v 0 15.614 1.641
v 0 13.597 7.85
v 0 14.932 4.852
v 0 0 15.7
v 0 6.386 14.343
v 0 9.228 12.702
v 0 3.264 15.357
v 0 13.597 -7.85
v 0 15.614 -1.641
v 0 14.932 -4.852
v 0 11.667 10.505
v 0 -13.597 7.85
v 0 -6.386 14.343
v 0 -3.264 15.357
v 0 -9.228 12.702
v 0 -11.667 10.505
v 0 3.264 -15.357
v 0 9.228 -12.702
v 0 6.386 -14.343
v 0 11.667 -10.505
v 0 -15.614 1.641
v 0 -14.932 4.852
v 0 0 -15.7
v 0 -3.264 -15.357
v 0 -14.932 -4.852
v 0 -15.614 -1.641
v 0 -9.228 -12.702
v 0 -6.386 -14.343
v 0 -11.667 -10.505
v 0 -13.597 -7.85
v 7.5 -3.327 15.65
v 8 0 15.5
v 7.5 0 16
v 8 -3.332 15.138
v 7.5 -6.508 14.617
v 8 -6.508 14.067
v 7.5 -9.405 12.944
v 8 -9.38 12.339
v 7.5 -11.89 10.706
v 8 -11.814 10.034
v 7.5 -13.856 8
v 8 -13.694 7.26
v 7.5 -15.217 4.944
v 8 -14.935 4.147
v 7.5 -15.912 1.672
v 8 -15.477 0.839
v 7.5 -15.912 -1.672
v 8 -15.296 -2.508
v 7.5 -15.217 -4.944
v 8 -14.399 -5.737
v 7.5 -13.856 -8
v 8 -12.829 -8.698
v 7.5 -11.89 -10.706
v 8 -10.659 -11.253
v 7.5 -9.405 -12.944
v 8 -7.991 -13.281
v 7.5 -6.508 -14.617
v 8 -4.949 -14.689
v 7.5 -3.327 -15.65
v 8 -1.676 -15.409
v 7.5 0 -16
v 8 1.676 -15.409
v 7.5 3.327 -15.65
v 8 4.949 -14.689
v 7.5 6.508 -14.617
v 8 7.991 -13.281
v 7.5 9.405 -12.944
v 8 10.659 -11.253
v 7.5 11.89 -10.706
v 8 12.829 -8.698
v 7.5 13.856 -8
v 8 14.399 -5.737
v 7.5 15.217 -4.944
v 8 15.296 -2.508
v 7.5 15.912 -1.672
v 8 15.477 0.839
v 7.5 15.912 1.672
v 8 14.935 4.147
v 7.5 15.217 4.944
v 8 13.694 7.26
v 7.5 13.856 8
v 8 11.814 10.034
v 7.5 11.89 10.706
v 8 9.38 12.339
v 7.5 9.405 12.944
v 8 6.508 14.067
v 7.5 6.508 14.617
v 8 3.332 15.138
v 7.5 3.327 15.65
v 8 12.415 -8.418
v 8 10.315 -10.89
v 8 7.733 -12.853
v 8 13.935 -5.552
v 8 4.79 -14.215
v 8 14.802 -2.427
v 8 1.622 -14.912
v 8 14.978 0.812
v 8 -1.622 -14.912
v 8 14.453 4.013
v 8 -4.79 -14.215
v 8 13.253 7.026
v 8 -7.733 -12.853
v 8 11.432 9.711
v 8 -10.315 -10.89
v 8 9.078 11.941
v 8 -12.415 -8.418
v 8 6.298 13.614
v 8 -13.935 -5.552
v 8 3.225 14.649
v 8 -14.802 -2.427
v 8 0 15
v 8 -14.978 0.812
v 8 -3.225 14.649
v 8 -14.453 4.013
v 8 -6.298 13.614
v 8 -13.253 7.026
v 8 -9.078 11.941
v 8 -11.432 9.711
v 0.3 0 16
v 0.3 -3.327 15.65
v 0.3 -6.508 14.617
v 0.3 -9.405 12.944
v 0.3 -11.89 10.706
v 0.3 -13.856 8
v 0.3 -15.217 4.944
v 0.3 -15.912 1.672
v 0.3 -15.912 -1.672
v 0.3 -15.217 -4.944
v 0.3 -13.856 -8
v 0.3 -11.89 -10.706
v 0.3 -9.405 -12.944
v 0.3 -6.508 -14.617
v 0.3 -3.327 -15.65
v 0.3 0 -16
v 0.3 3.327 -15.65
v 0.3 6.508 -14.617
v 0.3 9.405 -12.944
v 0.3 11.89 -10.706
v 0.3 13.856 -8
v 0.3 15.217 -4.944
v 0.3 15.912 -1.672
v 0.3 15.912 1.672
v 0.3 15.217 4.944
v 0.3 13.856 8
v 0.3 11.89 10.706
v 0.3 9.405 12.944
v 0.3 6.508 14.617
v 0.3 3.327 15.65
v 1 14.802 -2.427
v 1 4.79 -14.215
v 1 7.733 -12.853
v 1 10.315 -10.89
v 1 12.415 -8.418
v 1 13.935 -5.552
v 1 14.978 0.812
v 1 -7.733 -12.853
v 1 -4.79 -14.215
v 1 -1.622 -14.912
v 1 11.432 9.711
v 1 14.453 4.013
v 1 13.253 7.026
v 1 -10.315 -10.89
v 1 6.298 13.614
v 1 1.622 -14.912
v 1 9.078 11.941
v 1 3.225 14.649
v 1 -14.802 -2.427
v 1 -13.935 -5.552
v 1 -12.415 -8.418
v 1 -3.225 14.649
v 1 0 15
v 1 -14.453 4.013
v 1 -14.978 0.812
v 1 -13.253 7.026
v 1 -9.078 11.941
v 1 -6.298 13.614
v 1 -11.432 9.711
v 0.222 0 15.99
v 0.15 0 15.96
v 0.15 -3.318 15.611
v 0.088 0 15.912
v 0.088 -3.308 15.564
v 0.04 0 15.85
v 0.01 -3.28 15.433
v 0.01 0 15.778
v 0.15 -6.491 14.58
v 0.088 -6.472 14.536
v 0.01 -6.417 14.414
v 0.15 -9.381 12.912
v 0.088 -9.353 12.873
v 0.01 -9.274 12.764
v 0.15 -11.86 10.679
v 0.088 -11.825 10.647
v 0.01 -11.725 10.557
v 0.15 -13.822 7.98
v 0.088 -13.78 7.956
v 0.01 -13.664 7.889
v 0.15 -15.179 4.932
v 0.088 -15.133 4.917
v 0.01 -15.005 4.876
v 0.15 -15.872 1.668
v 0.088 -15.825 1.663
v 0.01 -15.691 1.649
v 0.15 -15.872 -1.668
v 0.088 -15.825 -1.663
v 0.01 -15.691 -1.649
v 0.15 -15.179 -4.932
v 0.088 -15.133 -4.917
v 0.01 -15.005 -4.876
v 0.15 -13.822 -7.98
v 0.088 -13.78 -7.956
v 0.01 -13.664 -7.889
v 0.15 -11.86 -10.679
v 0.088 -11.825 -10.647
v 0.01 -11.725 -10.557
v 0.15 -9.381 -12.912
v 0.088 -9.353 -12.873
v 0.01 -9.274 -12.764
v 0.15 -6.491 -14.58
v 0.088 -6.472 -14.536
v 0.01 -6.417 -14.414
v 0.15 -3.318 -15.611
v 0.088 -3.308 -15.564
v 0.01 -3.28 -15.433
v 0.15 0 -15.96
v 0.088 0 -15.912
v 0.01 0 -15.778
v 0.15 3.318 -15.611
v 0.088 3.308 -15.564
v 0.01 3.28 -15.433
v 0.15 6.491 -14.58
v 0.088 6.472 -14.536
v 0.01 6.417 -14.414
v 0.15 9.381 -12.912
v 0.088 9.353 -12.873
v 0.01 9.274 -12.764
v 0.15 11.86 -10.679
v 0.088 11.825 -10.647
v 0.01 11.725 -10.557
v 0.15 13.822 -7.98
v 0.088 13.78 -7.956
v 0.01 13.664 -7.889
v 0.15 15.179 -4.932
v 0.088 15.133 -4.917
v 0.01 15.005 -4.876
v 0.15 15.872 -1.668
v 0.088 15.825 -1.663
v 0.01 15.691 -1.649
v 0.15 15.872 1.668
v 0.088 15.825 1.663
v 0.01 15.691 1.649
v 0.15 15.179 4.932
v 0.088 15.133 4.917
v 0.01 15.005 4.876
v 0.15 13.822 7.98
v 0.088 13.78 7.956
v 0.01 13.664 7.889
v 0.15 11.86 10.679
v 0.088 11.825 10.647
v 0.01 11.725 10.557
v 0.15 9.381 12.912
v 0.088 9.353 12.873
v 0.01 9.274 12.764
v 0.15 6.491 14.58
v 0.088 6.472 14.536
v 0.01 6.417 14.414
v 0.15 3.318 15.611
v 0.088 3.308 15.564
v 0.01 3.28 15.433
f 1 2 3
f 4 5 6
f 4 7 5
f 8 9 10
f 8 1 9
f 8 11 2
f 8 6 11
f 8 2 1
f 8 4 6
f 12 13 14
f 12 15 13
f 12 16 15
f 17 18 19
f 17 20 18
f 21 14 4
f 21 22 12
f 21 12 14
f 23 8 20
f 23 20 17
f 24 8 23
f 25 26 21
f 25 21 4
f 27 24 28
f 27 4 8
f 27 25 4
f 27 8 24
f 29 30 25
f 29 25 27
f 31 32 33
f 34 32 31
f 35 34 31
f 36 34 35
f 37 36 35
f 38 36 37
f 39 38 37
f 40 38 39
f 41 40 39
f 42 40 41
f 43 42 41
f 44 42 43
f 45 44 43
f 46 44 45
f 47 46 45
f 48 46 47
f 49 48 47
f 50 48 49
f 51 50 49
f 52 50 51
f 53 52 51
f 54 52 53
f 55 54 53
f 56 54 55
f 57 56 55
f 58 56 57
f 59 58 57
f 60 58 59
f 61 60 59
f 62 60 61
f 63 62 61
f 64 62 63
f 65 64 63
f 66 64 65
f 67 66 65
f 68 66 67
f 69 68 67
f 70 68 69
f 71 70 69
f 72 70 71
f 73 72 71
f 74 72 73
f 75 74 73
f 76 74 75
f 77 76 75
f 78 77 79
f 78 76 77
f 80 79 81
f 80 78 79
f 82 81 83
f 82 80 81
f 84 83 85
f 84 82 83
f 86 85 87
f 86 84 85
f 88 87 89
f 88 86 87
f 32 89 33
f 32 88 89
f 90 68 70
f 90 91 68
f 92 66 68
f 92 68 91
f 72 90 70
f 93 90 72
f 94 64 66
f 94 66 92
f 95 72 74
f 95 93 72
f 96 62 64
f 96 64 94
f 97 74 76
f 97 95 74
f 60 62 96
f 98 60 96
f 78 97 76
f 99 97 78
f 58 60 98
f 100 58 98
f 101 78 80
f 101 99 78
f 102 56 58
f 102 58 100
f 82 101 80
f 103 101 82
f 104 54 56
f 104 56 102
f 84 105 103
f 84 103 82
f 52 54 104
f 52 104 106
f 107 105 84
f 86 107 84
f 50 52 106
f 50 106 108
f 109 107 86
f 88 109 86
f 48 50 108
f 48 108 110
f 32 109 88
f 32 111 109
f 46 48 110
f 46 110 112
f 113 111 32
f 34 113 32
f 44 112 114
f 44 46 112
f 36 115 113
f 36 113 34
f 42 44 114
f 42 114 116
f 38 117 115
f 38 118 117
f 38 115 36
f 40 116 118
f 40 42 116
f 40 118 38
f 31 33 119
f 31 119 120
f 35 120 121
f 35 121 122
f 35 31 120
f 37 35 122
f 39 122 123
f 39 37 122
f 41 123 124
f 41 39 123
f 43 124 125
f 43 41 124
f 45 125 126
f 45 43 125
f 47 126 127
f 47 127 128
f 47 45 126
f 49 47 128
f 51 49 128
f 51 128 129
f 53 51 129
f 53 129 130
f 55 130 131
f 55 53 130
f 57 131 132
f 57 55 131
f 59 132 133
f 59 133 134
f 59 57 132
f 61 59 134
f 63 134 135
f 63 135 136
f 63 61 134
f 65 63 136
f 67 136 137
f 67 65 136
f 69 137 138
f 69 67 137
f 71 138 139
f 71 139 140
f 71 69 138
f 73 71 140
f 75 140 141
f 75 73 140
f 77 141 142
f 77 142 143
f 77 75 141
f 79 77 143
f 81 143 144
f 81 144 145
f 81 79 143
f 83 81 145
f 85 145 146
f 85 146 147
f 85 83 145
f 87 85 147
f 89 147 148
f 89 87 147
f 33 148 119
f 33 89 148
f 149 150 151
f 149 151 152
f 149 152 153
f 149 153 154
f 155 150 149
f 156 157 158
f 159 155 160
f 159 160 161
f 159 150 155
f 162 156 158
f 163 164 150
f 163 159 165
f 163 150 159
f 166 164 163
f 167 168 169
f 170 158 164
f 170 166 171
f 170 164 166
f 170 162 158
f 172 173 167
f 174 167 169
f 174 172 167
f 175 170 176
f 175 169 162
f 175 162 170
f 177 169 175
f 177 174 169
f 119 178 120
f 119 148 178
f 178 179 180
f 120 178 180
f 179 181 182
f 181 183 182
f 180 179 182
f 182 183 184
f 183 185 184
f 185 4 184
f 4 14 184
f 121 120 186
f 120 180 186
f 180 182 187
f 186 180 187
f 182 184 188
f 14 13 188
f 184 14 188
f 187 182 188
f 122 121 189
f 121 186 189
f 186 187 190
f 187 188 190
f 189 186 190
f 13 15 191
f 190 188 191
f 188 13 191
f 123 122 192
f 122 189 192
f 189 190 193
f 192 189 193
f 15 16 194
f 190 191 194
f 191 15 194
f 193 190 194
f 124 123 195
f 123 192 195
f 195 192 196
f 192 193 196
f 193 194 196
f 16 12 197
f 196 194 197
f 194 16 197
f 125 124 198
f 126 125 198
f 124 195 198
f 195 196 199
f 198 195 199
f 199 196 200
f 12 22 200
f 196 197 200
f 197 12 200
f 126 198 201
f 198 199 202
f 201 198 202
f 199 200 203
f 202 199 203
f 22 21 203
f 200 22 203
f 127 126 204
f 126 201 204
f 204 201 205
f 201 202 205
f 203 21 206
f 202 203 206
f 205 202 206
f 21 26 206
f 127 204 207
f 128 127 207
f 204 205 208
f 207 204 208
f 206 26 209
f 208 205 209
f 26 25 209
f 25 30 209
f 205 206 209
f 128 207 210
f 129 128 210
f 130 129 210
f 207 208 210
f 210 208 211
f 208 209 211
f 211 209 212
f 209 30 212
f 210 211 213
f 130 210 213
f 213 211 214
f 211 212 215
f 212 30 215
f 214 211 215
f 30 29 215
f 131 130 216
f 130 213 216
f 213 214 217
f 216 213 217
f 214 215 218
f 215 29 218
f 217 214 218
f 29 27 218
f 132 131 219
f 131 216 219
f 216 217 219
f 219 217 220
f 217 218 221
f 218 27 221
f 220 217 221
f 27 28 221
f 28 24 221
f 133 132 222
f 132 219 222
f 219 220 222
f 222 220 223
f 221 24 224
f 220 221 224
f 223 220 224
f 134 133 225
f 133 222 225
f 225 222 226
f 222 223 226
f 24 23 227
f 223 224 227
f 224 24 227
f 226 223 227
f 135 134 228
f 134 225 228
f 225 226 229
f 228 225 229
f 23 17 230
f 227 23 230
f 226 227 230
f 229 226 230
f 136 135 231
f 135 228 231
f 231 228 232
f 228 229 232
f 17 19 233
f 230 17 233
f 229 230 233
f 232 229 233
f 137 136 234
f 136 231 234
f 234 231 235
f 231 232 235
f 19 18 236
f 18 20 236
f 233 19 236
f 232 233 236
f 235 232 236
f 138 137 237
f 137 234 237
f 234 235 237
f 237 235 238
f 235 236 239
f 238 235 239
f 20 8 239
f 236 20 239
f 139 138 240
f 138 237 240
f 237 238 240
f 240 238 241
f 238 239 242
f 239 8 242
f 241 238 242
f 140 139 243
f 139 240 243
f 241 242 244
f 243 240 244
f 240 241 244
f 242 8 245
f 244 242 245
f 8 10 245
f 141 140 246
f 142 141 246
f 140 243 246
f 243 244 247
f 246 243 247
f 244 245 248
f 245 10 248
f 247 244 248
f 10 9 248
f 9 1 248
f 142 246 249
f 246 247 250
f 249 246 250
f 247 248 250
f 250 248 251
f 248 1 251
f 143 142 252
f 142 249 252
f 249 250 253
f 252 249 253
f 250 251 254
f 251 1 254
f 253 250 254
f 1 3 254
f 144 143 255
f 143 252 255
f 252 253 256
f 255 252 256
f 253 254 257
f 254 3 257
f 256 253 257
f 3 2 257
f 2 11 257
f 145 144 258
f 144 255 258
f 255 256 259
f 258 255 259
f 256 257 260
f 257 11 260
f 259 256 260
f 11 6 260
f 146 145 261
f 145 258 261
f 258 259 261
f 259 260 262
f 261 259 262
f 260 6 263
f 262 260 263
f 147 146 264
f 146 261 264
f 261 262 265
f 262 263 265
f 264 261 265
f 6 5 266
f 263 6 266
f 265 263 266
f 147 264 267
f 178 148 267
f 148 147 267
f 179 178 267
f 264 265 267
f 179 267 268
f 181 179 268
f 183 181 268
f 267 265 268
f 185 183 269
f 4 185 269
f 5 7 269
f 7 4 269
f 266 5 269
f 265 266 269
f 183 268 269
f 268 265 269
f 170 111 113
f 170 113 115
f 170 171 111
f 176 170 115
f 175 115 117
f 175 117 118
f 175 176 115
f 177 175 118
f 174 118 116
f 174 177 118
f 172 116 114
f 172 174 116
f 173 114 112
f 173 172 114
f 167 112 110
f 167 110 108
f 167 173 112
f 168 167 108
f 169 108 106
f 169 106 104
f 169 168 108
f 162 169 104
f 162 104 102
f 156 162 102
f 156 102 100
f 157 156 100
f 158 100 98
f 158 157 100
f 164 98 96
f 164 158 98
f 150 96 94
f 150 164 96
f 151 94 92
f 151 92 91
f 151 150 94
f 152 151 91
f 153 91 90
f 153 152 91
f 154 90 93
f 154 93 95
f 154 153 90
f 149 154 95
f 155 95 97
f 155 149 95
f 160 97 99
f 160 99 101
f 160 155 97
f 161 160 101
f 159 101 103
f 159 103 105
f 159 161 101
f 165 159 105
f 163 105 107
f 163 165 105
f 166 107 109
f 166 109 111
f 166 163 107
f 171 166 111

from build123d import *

# Parameters (mm, degrees)
CHANFREIN1_SIZE = 0.5
CONG_1_R        = 0.3


with BuildPart() as part:
    # Esquisse1 → Révol.-Mince2 (revolve)
    with BuildSketch(Plane.XY, mode=Mode.PRIVATE) as r_vol_mince2_sk:
        Polygon((0, 0), (0, 16), (8, 16), (8, 15), (1, 15), (1, 0), align=None)
    revolve(r_vol_mince2_sk.sketch.rotate(Axis((-7.892655367, 0, 0), (1, 0, 0)), 90), axis=Axis((-7.892655367, 0, 0), (1, 0, 0)))

    # Chanfrein1
    chanfrein1_edges = [part.edges().sort_by_distance(p)[0] for p in [
        (8, 0, -16),
    ]]
    chamfer(chanfrein1_edges, length=CHANFREIN1_SIZE)

    # Congé1
    cong_1_edges = [part.edges().sort_by_distance(p)[0] for p in [
        (0, 0, -16),
    ]]
    fillet(cong_1_edges, radius=CONG_1_R)


solid = part.part
